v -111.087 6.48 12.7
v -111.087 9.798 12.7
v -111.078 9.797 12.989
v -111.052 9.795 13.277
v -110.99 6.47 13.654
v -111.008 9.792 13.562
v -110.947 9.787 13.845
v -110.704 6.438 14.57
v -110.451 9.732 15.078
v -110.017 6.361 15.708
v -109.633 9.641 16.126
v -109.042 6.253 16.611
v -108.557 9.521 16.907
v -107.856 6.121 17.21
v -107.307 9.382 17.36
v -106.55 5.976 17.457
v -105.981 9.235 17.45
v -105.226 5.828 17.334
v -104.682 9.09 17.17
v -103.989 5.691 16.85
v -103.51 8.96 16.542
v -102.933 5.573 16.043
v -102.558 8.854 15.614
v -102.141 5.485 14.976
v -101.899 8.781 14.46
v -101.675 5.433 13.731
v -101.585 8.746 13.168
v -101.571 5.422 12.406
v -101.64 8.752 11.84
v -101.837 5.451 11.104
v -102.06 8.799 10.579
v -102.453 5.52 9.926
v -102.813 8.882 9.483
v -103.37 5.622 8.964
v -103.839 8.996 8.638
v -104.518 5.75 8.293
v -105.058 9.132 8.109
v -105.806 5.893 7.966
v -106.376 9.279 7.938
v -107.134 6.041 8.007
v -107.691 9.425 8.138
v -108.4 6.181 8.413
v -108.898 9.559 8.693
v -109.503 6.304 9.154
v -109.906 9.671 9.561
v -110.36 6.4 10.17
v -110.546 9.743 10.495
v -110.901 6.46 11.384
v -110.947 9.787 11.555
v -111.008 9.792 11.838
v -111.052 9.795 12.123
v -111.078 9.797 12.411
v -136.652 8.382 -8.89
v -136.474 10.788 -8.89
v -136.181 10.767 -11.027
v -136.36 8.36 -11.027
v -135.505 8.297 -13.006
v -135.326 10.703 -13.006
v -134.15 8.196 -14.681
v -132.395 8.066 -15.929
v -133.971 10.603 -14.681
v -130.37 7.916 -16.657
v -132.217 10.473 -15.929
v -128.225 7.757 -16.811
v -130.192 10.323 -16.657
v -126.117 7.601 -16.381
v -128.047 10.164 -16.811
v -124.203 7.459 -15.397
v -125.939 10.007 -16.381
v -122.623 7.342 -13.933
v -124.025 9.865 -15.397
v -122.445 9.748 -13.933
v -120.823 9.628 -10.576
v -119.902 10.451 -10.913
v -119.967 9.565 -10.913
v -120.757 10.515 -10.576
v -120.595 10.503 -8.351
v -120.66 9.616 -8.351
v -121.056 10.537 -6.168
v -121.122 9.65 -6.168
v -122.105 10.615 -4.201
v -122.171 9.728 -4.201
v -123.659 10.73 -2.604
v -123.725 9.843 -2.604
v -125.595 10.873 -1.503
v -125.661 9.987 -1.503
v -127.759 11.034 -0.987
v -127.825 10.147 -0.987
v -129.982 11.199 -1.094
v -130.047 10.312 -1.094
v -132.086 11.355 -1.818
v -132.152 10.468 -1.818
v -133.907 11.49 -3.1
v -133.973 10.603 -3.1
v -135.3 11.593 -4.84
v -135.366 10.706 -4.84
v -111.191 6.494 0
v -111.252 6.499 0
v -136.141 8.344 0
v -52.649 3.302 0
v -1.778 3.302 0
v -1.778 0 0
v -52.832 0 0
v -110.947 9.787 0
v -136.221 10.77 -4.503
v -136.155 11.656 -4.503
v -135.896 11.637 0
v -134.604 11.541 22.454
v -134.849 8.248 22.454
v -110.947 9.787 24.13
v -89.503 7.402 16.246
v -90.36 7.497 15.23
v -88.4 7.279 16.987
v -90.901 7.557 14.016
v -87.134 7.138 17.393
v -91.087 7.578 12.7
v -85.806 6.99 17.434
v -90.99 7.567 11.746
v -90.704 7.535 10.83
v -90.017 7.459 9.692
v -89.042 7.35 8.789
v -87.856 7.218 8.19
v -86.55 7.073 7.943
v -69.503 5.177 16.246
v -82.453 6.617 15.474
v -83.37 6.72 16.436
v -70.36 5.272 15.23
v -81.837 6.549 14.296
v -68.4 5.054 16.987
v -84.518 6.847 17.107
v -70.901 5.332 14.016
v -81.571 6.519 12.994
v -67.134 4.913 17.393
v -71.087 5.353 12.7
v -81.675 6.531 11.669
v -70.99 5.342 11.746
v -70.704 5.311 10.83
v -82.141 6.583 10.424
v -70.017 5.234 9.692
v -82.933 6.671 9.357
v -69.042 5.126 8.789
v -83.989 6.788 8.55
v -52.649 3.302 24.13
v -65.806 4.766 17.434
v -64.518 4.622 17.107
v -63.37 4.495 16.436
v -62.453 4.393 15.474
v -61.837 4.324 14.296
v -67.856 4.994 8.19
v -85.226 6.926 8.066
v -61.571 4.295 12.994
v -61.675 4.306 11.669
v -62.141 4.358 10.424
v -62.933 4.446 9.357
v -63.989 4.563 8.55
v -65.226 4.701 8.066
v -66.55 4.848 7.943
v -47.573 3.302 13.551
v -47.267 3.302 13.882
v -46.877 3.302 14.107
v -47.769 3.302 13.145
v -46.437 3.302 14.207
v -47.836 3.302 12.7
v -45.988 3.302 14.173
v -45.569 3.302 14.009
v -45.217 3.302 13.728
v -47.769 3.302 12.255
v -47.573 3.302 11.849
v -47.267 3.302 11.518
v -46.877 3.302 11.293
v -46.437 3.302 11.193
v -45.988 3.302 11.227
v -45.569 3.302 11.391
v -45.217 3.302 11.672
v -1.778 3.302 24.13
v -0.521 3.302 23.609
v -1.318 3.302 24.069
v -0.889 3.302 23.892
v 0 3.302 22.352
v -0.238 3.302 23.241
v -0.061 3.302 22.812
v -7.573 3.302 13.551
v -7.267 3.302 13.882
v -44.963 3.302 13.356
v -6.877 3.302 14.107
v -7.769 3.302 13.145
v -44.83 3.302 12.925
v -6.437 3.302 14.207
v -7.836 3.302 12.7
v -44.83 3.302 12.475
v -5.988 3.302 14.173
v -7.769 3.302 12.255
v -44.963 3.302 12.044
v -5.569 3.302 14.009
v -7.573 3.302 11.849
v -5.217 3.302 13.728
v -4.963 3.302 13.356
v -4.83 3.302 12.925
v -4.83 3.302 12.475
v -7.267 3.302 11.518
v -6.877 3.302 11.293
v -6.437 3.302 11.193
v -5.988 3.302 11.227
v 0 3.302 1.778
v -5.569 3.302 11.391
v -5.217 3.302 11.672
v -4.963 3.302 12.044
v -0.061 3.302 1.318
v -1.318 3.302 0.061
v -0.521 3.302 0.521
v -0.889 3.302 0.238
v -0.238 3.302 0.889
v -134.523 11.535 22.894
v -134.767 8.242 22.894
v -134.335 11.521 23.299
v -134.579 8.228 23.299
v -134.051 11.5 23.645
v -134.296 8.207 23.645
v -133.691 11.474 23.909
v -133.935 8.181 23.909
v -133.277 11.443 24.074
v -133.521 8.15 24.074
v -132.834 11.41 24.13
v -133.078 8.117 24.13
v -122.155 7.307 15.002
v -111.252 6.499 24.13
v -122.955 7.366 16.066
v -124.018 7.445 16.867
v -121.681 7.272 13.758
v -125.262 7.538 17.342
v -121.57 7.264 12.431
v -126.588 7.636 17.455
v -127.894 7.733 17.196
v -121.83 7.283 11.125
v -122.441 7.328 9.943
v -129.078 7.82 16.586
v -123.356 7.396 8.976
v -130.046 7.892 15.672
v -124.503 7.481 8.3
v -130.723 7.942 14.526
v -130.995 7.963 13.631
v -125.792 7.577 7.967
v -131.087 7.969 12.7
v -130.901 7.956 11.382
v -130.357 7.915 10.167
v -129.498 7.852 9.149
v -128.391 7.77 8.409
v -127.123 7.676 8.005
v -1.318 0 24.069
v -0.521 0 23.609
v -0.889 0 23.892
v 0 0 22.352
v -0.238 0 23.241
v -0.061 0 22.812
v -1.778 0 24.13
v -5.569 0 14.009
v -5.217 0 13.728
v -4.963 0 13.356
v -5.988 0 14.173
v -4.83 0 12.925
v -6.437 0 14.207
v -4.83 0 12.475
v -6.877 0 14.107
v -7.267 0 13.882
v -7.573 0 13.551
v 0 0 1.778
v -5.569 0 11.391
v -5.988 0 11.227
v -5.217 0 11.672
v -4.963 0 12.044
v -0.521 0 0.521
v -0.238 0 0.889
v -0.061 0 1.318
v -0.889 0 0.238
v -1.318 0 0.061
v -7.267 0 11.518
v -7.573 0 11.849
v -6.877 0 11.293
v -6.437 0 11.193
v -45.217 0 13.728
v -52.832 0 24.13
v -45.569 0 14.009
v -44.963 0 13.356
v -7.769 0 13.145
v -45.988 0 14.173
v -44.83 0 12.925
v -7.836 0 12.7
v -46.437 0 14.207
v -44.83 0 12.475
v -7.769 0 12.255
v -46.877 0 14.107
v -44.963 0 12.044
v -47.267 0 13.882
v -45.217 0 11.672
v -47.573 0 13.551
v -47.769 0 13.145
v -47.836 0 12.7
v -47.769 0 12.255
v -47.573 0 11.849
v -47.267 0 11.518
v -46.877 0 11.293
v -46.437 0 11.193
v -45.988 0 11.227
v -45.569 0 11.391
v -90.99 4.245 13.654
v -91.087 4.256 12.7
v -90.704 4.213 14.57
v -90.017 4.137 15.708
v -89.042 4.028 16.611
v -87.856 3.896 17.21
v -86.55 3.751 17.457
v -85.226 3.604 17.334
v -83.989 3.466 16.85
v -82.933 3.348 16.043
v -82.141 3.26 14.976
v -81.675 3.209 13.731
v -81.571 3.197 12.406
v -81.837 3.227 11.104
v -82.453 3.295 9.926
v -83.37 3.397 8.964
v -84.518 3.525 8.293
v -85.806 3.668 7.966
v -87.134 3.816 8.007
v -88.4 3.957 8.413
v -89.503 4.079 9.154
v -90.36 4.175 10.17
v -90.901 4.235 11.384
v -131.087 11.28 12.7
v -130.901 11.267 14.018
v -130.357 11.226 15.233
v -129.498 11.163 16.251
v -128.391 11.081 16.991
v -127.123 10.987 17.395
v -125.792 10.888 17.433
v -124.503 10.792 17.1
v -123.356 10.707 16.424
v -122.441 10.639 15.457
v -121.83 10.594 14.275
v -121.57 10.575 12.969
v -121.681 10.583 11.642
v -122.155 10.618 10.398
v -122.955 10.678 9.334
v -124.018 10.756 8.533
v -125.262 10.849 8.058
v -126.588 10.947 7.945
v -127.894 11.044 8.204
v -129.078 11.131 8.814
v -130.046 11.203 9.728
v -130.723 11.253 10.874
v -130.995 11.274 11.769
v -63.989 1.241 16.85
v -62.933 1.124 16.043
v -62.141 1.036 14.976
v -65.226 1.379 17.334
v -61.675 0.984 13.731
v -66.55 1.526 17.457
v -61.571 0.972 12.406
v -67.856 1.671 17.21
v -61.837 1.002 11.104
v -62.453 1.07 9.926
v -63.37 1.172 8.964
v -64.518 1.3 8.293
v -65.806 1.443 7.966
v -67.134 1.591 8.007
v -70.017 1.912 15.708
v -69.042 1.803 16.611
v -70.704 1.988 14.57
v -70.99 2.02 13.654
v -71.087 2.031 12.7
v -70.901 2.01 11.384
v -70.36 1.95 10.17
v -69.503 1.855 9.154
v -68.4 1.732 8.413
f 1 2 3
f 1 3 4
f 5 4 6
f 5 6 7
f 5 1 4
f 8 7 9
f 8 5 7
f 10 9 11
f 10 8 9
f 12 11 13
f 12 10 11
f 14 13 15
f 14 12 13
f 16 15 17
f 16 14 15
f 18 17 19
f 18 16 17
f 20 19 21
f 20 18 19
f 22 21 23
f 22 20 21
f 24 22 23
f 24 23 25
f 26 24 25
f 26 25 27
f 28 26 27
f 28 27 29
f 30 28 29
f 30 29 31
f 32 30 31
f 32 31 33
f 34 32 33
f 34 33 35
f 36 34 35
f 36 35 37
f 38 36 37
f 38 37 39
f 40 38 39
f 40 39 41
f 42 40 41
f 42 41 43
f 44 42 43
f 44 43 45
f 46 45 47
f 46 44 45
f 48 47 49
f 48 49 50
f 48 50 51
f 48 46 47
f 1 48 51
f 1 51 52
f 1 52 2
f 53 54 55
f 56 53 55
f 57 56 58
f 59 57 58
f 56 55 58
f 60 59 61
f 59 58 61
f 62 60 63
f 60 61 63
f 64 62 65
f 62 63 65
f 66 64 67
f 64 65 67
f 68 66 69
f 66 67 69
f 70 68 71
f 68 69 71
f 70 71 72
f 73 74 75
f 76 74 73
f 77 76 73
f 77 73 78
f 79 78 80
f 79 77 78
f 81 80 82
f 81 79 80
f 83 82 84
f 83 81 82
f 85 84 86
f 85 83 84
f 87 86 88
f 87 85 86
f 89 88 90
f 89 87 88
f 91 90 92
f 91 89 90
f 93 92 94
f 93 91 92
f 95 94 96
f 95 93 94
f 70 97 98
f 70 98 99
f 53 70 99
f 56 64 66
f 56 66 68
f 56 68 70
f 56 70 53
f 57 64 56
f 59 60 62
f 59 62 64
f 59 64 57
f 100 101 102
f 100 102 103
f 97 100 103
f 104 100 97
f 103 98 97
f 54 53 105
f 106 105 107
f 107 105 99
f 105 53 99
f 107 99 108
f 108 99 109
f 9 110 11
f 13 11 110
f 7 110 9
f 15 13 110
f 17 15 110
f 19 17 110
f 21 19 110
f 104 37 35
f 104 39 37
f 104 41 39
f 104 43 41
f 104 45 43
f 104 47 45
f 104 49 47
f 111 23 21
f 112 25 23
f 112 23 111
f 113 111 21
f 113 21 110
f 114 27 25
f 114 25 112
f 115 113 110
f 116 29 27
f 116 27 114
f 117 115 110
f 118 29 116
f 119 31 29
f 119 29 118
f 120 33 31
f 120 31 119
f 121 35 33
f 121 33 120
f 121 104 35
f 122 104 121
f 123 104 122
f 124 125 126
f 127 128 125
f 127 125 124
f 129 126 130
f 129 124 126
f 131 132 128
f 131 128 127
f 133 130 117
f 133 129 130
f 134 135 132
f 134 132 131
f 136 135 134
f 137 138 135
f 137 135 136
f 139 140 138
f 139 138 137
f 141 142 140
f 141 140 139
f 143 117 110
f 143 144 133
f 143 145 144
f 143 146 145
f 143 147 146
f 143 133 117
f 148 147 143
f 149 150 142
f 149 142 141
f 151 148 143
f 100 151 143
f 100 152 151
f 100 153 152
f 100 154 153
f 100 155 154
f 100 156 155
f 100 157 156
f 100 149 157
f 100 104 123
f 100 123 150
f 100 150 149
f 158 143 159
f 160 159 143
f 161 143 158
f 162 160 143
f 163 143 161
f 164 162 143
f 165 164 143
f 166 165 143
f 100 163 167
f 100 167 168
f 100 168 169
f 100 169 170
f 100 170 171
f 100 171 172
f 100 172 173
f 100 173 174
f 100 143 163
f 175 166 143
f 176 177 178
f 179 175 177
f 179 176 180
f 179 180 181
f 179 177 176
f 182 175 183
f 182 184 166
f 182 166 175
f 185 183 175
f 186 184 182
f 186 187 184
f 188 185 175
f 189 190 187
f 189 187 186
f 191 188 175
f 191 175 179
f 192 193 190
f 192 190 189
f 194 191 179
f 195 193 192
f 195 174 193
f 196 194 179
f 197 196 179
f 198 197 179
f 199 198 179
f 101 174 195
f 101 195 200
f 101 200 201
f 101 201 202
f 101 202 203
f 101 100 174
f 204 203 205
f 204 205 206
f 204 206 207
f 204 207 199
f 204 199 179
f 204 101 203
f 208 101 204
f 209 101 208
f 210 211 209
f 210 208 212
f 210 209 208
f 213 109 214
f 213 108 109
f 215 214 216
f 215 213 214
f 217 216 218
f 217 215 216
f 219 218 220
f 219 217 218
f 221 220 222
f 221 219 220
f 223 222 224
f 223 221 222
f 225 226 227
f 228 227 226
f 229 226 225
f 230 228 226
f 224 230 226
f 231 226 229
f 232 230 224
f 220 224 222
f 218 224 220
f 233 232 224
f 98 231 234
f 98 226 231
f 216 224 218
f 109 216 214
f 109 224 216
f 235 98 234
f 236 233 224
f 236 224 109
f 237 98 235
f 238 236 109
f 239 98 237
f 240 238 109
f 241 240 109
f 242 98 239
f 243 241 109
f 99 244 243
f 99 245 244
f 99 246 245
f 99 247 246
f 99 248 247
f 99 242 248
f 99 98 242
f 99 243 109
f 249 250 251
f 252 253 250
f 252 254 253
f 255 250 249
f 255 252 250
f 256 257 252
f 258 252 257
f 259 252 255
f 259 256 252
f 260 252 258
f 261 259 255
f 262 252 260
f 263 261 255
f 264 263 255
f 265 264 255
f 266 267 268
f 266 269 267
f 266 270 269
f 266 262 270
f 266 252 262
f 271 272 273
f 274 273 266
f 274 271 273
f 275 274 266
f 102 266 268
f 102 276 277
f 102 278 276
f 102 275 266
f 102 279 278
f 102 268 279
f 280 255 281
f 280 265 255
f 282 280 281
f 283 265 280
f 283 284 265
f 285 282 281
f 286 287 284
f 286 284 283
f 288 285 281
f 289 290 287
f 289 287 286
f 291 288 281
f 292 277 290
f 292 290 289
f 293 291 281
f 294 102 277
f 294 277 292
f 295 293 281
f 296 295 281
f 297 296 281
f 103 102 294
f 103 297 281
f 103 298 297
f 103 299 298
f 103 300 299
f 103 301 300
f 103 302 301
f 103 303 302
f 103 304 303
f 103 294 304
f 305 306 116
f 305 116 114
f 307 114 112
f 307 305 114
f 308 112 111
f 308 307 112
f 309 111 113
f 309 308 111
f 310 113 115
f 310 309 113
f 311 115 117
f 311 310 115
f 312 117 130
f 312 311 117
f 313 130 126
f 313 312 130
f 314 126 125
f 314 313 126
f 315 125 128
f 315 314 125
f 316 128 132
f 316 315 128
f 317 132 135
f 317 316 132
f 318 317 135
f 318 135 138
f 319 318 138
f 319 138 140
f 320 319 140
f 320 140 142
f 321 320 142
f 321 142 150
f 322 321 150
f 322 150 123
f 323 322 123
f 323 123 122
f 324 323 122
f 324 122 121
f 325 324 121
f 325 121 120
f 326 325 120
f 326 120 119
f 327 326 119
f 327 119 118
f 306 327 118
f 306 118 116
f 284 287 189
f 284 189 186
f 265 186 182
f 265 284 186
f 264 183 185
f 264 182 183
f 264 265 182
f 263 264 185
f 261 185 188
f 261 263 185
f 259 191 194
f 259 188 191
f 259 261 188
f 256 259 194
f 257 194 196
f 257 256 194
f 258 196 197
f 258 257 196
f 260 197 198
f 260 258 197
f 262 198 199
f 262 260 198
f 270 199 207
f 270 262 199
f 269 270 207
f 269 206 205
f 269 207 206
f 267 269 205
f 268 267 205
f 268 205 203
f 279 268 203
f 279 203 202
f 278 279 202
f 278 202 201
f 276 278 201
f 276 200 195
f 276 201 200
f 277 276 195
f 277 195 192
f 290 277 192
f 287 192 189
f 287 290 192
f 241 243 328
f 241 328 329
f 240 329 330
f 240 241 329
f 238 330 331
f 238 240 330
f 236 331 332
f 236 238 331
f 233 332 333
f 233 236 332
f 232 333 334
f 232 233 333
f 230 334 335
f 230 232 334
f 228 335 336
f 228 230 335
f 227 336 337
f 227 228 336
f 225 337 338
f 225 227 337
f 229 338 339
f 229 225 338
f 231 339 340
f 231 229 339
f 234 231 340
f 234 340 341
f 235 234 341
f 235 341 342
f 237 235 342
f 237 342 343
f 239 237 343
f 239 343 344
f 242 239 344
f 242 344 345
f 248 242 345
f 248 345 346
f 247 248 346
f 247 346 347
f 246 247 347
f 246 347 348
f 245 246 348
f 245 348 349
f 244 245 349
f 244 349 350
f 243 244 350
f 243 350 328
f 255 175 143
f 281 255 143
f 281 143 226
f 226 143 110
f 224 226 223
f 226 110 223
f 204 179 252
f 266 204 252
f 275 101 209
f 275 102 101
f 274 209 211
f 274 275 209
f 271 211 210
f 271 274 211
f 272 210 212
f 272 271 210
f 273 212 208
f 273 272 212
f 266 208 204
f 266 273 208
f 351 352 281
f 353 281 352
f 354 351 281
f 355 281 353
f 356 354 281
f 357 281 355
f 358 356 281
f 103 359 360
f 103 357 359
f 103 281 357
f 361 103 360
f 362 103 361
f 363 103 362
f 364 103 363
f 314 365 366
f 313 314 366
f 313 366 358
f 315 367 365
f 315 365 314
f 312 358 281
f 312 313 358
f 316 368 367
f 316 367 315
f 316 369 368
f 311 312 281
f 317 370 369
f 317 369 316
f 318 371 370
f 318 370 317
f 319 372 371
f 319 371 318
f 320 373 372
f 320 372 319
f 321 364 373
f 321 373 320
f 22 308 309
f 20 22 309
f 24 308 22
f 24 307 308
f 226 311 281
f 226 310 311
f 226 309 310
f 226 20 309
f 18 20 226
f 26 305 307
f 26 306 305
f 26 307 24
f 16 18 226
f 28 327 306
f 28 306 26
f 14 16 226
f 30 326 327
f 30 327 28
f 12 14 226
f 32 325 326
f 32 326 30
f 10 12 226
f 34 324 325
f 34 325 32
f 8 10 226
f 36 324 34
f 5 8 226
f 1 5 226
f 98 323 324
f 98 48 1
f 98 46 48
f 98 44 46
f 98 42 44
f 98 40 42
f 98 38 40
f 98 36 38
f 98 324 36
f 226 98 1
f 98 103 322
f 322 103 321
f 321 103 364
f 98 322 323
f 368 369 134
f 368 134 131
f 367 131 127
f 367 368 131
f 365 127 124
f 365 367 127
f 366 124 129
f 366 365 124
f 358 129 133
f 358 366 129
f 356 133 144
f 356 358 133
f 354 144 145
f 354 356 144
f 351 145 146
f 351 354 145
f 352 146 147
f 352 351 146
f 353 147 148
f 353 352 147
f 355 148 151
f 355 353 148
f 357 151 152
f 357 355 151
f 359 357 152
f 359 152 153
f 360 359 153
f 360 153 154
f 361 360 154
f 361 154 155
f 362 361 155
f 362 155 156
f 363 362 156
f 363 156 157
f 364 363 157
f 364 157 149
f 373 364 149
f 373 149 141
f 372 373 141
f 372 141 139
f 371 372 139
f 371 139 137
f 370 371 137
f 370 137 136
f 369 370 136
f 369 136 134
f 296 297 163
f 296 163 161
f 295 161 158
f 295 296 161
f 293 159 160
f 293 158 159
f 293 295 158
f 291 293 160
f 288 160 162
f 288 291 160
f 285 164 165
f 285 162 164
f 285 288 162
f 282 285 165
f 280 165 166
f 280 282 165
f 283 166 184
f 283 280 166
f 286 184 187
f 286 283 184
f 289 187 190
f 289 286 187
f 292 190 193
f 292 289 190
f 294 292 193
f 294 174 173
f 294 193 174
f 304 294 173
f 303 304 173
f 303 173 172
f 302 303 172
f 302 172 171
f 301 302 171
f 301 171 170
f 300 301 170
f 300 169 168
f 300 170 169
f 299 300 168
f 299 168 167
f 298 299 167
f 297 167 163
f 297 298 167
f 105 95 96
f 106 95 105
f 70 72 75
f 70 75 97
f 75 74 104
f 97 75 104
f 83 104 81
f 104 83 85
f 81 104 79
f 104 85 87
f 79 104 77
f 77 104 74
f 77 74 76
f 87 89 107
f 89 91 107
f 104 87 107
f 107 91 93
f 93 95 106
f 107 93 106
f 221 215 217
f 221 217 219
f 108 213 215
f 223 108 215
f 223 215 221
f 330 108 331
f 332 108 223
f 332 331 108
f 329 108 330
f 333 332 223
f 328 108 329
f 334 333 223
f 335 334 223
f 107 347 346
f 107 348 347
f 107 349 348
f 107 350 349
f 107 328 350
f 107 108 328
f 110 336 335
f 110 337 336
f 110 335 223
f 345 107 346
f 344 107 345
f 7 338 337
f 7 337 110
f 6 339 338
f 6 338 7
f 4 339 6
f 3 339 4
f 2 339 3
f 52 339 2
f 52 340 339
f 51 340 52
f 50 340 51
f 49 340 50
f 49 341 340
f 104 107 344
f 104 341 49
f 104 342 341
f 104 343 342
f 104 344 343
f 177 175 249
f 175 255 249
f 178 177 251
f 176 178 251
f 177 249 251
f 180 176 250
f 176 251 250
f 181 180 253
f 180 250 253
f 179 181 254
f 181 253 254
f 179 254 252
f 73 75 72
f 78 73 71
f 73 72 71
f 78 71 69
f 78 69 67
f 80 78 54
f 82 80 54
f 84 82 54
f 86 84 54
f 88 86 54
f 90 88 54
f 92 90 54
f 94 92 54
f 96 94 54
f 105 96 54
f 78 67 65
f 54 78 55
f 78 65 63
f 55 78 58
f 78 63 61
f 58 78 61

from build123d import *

# Parameters (mm, degrees)
BOSS_EXTRUDE1_DEPTH     = 24.13
CUT_EXTRUDE1_DEPTH      = 140.018460965
CUT_EXTRUDE1_DEPTH_BACK = 140.018460965
SKETCH2_R               = 1.5113
SKETCH2_R_2             = 4.7625
BOSS_EXTRUDE2_DEPTH     = 3.302
CUT_EXTRUDE2_DEPTH      = 140.247845391
CUT_EXTRUDE2_DEPTH_BACK = 140.247845391
FILLET1_R               = 1.778
CUT_EXTRUDE3_DEPTH      = 0.889


with BuildPart() as part:
    # Sketch1 → Boss-Extrude1 (new body)
    with BuildSketch(Plane.XY):
        Polygon((0, 0), (-52.832, 0), (-111.252, 6.498782895), (-136.652, 8.382), (-136.407851909, 11.674961541), (-110.947287613, 9.787254053), (-52.648903452, 3.302), (0, 3.302), align=None)
    extrude(amount=BOSS_EXTRUDE1_DEPTH)

    # Sketch2 → Cut-Extrude1 (cut, two sides: drawn at the far end of the back side and taken through both)
    with BuildSketch(Plane(origin=(0, 3.302, 0), x_dir=(1, 0, 0), z_dir=(0, 1, 0)).offset(-CUT_EXTRUDE1_DEPTH_BACK)):
        with Locations(Location((-6.324451726, -12.7, 0), (0, 0, 180))):
            Circle(SKETCH2_R)
        with Locations(Location((-46.324451726, -12.7, 0), (0, 0, 180))):
            Circle(SKETCH2_R)
        with Locations(Location((-66.324451726, -12.7, 0), (0, 0, 180))):
            Circle(SKETCH2_R_2)
        with Locations(Location((-86.324451726, -12.7, 0), (0, 0, 180))):
            Circle(SKETCH2_R_2)
        with Locations(Location((-106.324451726, -12.7, 0), (0, 0, 180))):
            Circle(SKETCH2_R_2)
        with Locations(Location((-126.324451726, -12.7, 0), (0, 0, 180))):
            Circle(SKETCH2_R_2)
    extrude(amount=CUT_EXTRUDE1_DEPTH + CUT_EXTRUDE1_DEPTH_BACK, mode=Mode.SUBTRACT)

    # Sketch3 → Boss-Extrude2 (add)
    with BuildSketch(Plane(origin=(0.115129755, 1.552819246, 0), x_dir=(0.9972627319520296, -0.07393945806924965, 0), z_dir=(0.07393945806924965, 0.9972627319520296, 0))):
        with BuildLine():
            Line((-136.897707384, 0), (-136.897707384, 8.89))
            ThreePointArc((-136.897707384, 8.89), (-131.63888491, 16.361853382), (-122.830660339, 13.933070421))
            Line((-122.830660339, 13.933070421), (-111.367259408, 0))
            Line((-111.367259408, 0), (-136.897707384, 0))
        make_face()
    extrude(amount=-BOSS_EXTRUDE2_DEPTH)

    # Sketch4 → Cut-Extrude2 (cut, two sides: drawn at the far end of the back side and taken through both)
    with BuildSketch(Plane(origin=(0.115129755, 1.552819246, 0), x_dir=(0.9972627319520296, -0.07393945806924965, 0), z_dir=(0.07393945806924965, 0.9972627319520296, 0)).offset(-CUT_EXTRUDE2_DEPTH_BACK)):
        Polygon((-136.897707384, 8.89), (-134.992707384, -24.13), (-136.897707384, -24.13), (-138.802707384, -24.13), (-138.802707384, 8.89), align=None)
    extrude(amount=CUT_EXTRUDE2_DEPTH + CUT_EXTRUDE2_DEPTH_BACK, mode=Mode.SUBTRACT)

    # Fillet1
    fillet1_edges = [part.edges().sort_by_distance(p)[0] for p in [
        (0, 1.651, 0),
        (0, 1.651, 24.13),
        (-134.63014045, 9.887626103, 24.13),
    ]]
    fillet(fillet1_edges, radius=FILLET1_R)

    # Sketch5 → Cut-Extrude3 (cut)
    with BuildSketch(Plane(origin=(0.115129755, 1.552819246, 0), x_dir=(0.9972627319520296, -0.07393945806924965, 0), z_dir=(0.07393945806924965, 0.9972627319520296, 0))):
        with BuildLine():
            Line((-135.786917217, 4.840316171), (-136.644610097, 4.502980352))
            Line((-136.644610097, 4.502980352), (-136.88295075, 8.406219254))
            ThreePointArc((-136.88295075, 8.406219254), (-131.865445622, 16.27671084), (-122.830660339, 13.933070421))
            Line((-122.830660339, 13.933070421), (-120.346128436, 10.913272179))
            Line((-120.346128436, 10.913272179), (-121.203821316, 10.57593636))
            ThreePointArc((-121.203821316, 10.57593636), (-126.054969147, 1.50328916), (-135.786917217, 4.840316171))
        make_face()
    extrude(amount=-CUT_EXTRUDE3_DEPTH, mode=Mode.SUBTRACT)


solid = part.part
